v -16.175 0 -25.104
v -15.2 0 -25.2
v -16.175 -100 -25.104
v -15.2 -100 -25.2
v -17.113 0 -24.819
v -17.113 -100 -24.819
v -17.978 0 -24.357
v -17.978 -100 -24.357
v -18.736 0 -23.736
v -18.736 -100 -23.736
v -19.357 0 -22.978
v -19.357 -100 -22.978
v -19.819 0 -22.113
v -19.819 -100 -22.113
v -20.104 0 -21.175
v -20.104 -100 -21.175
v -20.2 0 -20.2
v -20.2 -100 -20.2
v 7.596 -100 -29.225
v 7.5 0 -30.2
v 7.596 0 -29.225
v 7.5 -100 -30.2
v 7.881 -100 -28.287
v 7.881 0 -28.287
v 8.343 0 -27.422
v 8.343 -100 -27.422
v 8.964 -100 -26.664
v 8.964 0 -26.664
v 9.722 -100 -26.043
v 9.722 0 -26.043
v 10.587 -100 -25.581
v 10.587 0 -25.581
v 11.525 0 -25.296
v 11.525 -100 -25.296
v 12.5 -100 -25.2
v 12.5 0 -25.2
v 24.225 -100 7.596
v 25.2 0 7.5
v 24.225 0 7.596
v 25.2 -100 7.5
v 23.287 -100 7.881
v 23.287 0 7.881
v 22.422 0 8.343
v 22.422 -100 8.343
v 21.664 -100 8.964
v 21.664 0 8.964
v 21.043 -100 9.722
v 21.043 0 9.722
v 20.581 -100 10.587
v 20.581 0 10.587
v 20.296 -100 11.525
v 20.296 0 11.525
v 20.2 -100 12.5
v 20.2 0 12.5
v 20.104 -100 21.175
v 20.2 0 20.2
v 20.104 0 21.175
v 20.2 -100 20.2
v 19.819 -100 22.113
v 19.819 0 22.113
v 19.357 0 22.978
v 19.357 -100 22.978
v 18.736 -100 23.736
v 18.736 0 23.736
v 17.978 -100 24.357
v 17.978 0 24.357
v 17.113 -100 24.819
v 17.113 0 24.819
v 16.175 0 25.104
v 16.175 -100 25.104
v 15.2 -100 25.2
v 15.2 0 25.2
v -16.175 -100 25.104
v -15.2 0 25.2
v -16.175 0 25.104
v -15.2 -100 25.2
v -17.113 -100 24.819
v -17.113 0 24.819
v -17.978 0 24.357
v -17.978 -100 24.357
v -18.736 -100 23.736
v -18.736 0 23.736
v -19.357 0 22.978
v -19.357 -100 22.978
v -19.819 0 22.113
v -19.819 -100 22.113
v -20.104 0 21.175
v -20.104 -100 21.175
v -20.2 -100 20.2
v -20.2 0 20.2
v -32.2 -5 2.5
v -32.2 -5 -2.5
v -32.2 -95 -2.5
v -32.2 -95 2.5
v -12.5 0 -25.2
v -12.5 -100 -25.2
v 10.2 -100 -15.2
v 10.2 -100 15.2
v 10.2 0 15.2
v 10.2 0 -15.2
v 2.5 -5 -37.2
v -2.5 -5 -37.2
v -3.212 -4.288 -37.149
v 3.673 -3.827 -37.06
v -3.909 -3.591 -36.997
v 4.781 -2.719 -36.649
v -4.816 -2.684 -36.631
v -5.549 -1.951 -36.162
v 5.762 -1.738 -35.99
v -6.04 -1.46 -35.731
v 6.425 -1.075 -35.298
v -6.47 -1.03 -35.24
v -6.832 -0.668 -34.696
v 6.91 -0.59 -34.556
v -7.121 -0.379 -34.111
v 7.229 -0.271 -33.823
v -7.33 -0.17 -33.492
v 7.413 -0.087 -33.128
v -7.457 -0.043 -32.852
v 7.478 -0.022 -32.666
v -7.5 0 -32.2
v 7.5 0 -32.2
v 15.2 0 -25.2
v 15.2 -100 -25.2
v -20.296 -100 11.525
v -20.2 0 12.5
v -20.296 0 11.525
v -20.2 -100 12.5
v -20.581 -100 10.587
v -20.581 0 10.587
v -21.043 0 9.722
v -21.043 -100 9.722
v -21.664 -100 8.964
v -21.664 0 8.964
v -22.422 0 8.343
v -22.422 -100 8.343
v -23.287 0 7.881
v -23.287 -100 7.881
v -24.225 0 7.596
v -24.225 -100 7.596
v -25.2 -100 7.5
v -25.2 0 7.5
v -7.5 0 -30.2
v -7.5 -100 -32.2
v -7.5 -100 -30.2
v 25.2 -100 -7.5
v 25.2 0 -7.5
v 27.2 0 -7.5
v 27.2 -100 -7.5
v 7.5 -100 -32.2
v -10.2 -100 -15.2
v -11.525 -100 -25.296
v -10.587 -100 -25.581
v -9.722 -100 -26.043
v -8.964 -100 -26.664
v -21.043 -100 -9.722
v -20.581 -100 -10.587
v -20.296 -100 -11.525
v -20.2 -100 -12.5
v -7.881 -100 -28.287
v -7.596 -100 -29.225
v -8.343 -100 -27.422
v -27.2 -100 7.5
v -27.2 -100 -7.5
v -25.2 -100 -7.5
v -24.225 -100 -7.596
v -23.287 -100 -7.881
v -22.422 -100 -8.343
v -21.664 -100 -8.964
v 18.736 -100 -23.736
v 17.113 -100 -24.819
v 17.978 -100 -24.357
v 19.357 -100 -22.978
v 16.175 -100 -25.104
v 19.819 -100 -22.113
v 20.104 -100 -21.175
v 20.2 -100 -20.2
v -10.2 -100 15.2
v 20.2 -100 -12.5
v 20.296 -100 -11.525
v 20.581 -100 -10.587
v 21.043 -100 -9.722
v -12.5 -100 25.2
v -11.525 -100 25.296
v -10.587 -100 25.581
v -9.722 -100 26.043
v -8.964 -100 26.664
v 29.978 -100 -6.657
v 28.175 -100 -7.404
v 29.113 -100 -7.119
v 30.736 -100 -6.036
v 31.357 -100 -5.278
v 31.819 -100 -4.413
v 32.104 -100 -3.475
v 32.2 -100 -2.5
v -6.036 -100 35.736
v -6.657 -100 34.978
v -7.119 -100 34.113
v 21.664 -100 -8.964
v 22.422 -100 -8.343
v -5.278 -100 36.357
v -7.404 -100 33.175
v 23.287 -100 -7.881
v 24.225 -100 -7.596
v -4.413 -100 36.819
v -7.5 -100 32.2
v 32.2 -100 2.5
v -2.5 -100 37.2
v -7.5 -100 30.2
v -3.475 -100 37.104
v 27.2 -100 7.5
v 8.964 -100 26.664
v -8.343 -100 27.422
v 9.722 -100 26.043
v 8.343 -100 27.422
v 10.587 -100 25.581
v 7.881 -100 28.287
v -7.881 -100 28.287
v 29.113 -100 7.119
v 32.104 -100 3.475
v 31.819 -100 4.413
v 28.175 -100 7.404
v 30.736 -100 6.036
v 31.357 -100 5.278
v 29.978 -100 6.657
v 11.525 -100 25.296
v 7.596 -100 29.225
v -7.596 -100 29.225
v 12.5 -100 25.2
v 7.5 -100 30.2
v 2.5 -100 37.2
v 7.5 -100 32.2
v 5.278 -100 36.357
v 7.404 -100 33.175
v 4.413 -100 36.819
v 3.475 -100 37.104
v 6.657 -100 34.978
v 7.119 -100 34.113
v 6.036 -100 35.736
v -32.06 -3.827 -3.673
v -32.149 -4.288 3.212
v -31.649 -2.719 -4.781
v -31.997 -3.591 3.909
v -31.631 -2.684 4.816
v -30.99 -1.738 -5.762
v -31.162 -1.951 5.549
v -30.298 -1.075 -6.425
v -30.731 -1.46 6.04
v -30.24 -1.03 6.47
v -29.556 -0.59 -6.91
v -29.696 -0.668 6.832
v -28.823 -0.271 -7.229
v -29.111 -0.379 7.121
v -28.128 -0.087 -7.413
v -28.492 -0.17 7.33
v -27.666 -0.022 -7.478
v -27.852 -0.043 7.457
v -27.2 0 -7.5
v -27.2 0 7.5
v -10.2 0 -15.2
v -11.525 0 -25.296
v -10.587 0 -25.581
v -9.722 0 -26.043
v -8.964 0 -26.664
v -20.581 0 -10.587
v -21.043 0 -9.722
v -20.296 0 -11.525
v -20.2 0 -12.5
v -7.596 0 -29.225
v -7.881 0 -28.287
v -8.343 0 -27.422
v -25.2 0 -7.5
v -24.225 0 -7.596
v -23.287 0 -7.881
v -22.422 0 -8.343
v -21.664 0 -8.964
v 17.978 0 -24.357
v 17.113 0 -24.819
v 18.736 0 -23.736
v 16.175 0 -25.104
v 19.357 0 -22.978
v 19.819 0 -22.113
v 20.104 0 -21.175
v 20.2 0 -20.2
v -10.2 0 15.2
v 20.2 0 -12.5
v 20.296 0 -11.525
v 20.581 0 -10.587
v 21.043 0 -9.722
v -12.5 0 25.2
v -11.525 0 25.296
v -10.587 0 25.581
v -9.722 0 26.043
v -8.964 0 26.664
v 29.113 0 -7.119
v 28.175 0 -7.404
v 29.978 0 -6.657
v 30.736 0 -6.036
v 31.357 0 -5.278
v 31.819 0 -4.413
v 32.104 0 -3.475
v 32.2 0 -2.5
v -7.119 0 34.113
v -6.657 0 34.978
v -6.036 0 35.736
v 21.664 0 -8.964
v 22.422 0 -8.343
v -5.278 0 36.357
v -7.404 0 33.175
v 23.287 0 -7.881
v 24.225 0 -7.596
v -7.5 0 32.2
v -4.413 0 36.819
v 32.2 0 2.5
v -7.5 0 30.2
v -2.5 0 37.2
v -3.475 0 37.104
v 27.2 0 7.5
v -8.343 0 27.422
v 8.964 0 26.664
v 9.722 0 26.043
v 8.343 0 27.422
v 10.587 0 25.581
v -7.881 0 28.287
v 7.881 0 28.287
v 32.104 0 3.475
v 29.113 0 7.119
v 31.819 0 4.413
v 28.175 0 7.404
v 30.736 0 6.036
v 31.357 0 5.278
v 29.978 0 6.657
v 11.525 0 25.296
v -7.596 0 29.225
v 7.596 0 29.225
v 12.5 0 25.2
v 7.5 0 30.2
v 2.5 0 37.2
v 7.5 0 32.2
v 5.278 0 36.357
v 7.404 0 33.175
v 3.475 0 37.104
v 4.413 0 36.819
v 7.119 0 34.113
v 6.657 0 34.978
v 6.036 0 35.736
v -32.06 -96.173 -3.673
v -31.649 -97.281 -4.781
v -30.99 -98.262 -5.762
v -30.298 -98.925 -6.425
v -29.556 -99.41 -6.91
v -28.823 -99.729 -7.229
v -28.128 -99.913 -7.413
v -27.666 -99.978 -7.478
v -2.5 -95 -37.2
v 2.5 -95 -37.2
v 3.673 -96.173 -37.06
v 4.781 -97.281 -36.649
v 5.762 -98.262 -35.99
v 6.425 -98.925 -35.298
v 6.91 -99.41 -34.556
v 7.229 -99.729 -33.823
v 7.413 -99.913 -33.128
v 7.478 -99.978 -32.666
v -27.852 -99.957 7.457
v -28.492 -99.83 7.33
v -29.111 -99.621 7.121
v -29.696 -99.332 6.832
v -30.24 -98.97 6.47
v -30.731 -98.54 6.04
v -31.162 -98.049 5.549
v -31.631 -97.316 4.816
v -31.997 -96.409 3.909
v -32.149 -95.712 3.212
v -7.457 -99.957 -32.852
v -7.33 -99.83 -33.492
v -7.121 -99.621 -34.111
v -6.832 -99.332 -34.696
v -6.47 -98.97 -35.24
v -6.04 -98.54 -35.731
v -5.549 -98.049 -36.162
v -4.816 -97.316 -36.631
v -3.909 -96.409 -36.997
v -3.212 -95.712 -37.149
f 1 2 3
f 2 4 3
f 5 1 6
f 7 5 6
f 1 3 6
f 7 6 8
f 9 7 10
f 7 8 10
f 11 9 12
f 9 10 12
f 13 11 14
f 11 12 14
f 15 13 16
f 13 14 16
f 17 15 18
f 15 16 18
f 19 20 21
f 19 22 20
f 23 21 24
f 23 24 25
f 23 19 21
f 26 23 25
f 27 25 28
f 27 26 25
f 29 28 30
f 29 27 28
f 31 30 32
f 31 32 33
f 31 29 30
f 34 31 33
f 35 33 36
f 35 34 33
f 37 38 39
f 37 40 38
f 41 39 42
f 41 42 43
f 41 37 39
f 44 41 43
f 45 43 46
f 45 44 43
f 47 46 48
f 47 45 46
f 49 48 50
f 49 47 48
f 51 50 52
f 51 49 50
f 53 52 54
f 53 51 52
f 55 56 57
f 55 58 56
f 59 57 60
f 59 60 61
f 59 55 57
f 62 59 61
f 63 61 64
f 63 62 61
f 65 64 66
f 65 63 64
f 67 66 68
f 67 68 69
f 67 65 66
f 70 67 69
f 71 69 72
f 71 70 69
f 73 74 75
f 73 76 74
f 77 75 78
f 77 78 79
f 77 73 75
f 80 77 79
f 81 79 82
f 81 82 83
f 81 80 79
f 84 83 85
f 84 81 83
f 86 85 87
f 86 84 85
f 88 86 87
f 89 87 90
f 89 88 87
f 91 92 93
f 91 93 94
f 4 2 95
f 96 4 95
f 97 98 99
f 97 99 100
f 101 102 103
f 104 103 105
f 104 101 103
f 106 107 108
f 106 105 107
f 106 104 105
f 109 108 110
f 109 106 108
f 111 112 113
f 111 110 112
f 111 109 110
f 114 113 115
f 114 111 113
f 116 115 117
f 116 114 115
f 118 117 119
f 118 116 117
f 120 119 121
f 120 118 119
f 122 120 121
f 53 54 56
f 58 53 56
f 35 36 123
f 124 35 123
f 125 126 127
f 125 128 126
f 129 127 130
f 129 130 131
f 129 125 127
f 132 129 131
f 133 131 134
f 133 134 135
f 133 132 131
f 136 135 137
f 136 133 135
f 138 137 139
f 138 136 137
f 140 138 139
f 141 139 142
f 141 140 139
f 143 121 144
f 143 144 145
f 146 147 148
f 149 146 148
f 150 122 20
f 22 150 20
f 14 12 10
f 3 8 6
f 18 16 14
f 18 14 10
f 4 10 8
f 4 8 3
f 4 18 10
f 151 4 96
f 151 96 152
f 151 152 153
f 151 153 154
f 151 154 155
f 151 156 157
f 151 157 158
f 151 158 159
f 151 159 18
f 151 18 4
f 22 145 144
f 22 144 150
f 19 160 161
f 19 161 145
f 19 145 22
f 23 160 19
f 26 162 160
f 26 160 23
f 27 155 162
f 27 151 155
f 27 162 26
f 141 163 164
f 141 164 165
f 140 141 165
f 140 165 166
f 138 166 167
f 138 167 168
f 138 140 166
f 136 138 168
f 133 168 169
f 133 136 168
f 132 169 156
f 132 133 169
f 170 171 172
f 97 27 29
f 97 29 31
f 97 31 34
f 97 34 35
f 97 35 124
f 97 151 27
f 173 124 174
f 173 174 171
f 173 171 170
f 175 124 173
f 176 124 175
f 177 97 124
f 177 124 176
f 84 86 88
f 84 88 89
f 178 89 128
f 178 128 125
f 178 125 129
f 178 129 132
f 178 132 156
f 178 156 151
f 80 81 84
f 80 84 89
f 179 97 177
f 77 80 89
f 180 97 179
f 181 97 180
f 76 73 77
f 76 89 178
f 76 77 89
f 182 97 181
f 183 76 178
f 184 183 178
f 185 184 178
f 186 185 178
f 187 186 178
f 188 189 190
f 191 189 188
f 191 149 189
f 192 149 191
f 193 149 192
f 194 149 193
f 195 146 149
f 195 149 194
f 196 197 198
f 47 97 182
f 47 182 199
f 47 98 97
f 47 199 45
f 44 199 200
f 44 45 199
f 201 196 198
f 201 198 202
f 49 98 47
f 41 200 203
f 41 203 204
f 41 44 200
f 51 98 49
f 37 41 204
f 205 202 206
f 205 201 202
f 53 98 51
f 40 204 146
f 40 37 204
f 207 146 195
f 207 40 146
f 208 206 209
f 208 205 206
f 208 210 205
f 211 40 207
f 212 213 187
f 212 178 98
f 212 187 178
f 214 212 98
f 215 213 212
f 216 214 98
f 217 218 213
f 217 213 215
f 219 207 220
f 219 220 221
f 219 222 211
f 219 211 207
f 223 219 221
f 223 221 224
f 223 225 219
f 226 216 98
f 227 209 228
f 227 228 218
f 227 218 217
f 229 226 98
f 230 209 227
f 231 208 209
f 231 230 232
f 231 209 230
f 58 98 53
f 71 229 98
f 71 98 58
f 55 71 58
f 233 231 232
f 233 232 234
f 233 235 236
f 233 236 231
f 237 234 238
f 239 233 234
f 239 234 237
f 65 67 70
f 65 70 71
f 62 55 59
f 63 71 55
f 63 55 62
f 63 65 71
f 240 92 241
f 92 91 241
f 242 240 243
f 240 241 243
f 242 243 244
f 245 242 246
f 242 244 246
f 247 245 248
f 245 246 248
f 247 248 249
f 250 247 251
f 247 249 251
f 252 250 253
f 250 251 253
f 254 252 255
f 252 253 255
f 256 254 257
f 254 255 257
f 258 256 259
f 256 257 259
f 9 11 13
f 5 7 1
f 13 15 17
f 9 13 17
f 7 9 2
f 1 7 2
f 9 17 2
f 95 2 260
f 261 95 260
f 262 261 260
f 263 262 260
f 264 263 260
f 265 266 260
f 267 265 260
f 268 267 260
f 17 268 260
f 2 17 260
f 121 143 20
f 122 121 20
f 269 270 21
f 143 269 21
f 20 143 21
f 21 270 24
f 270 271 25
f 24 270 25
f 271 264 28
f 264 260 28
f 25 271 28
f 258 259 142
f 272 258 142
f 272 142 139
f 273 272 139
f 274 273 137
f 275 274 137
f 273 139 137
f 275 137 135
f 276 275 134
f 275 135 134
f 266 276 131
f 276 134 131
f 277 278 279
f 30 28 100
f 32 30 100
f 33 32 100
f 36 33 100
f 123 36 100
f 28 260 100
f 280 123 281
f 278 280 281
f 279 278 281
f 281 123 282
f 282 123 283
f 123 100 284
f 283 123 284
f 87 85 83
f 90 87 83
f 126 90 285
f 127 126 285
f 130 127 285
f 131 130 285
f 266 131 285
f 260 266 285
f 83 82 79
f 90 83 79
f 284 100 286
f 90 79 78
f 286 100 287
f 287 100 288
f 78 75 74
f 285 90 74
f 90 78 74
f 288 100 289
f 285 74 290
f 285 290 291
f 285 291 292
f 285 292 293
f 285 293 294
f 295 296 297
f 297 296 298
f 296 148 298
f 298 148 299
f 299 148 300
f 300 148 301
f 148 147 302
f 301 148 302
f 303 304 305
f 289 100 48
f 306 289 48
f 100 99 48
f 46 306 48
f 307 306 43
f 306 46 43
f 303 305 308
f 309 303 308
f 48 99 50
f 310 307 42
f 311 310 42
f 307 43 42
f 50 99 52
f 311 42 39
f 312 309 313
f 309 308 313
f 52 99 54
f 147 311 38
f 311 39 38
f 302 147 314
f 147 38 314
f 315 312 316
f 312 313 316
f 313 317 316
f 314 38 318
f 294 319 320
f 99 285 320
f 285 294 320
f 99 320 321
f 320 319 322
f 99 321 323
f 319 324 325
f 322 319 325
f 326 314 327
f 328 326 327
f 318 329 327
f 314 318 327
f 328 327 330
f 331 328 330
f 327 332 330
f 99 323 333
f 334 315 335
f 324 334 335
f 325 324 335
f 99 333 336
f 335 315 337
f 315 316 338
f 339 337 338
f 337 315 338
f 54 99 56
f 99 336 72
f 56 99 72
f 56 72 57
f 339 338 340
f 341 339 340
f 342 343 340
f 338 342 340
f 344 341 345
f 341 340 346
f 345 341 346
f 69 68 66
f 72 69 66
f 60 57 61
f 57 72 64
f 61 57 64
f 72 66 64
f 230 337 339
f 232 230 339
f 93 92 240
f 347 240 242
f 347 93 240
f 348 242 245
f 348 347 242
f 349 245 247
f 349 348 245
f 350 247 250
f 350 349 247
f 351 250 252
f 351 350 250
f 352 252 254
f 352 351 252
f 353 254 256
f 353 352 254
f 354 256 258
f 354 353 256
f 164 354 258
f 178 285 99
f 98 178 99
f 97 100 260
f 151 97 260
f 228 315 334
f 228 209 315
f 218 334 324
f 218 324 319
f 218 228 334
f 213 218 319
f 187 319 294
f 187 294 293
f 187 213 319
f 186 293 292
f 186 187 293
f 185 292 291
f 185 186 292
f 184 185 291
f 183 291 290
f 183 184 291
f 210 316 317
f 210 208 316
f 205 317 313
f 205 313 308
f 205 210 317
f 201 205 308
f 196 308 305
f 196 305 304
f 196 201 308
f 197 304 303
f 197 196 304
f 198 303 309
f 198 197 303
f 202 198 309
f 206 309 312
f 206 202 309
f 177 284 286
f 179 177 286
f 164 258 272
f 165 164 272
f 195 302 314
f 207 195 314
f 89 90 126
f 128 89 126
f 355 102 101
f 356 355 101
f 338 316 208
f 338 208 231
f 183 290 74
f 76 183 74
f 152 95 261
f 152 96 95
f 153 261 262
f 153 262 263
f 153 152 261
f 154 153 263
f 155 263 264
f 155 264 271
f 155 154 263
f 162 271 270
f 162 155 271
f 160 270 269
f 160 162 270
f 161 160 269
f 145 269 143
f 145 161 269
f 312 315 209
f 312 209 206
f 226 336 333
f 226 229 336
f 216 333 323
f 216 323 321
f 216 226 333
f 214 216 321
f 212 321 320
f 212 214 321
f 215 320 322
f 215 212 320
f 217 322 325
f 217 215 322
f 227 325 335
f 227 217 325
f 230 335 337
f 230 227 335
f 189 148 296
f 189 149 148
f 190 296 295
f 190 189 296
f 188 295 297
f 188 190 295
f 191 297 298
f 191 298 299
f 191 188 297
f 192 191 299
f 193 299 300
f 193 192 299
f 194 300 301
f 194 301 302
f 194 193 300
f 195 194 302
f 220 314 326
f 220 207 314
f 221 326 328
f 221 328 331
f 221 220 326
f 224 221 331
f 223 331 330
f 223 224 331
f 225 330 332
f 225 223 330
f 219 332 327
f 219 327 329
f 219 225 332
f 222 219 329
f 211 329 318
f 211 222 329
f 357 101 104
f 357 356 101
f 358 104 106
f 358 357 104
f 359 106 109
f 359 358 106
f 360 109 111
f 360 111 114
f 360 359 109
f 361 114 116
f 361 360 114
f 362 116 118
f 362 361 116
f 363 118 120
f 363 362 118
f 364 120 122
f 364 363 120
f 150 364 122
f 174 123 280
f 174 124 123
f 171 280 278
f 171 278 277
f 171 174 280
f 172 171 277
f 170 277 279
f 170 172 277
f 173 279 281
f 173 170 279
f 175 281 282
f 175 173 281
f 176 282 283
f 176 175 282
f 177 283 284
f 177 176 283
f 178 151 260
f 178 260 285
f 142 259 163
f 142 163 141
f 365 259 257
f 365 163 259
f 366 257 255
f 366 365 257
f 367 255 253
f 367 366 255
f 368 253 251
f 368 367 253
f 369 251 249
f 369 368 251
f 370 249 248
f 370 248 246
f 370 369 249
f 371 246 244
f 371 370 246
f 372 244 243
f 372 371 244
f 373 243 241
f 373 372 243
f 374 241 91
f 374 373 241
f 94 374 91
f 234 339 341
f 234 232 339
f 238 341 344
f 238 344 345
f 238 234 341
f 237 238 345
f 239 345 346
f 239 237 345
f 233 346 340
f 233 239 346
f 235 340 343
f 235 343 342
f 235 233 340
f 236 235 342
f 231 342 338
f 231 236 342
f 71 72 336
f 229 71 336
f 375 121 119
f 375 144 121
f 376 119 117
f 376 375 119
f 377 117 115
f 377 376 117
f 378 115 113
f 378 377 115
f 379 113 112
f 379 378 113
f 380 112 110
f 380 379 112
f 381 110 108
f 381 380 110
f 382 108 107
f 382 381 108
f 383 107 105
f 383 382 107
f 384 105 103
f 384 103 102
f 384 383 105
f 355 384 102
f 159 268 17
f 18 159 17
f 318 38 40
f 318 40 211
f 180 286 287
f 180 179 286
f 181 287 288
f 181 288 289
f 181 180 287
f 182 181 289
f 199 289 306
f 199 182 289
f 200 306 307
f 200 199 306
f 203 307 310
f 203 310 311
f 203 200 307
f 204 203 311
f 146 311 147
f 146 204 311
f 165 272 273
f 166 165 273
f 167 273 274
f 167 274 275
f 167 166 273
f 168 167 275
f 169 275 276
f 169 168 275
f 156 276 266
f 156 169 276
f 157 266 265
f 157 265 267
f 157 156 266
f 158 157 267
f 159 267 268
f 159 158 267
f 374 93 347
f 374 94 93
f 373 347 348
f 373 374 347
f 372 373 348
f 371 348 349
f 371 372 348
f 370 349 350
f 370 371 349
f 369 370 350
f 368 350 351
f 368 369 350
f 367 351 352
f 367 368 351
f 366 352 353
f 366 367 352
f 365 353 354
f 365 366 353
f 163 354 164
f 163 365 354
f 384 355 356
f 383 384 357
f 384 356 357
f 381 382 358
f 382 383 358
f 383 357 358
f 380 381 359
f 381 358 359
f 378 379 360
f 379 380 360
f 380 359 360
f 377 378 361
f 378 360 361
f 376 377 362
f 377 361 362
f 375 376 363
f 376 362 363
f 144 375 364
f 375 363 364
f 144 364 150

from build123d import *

# Parameters (mm, degrees)
F0_W     = 15
F0_H     = 10
F0_W_2   = 10
F0_H_2   = 15
F0_H_3   = 12
F0_W_3   = 12
F1_DEPTH = 100
F2_R     = 5


with BuildPart() as f1:
    # F0 (on Front) → F1 (new body)
    with BuildSketch(Plane.XZ):
        Polygon((10.2, -7.5), (10.2, -15.2), (7.5, -15.2), (7.5, -25.2), (20.2, -25.2), (20.2, -7.5), align=None)
        with Locations((0, -20.2)):
            Rectangle(F0_W, F0_H)
        with Locations((15.2, 0)):
            Rectangle(F0_W_2, F0_H_2)
        Polygon((-7.5, -25.2), (-7.5, -15.2), (-10.2, -15.2), (-10.2, -7.5), (-20.2, -7.5), (-20.2, -25.2), align=None)
        with Locations((0, -31.2)):
            Rectangle(F0_W, F0_H_3)
        Polygon((10.2, 15.2), (10.2, 7.5), (20.2, 7.5), (20.2, 25.2), (7.5, 25.2), (7.5, 15.2), align=None)
        with Locations((26.2, 0)):
            Rectangle(F0_W_3, F0_H_2)
        with Locations((-15.2, 0)):
            Rectangle(F0_W_2, F0_H_2)
        with Locations((0, 20.2)):
            Rectangle(F0_W, F0_H)
        Polygon((-20.2, 7.5), (-10.2, 7.5), (-10.2, 15.2), (-7.5, 15.2), (-7.5, 25.2), (-20.2, 25.2), align=None)
        with Locations((-26.2, 0)):
            Rectangle(F0_W_3, F0_H_2)
        with Locations((0, 31.2)):
            Rectangle(F0_W, F0_H_3)
    extrude(amount=F1_DEPTH)

    # F2
    f2_edges = [f1.edges().sort_by_distance(p)[0] for p in [
        (-20.2, -50, 25.2),
        (20.2, -50, 25.2),
        (20.2, -50, -25.2),
        (-20.2, -50, -25.2),
        (32.2, -50, 7.5),
        (32.2, -50, -7.5),
        (20.2, -50, 7.5),
        (20.2, -50, -7.5),
        (7.5, -50, 25.2),
        (7.5, -50, 37.2),
        (-7.5, -50, 37.2),
        (-7.5, -50, 25.2),
        (-20.2, -50, 7.5),
        (-32.2, -50, 7.5),
        (-32.2, -50, -7.5),
        (-32.2, 0, 0),
        (-32.2, -100, 0),
        (-20.2, -50, -7.5),
        (-7.5, -50, -25.2),
        (-7.5, -50, -37.2),
        (7.5, -50, -37.2),
        (0, 0, -37.2),
        (0, -100, -37.2),
        (7.5, -50, -25.2),
    ]]
    fillet(f2_edges, radius=F2_R)


solid = f1.part
